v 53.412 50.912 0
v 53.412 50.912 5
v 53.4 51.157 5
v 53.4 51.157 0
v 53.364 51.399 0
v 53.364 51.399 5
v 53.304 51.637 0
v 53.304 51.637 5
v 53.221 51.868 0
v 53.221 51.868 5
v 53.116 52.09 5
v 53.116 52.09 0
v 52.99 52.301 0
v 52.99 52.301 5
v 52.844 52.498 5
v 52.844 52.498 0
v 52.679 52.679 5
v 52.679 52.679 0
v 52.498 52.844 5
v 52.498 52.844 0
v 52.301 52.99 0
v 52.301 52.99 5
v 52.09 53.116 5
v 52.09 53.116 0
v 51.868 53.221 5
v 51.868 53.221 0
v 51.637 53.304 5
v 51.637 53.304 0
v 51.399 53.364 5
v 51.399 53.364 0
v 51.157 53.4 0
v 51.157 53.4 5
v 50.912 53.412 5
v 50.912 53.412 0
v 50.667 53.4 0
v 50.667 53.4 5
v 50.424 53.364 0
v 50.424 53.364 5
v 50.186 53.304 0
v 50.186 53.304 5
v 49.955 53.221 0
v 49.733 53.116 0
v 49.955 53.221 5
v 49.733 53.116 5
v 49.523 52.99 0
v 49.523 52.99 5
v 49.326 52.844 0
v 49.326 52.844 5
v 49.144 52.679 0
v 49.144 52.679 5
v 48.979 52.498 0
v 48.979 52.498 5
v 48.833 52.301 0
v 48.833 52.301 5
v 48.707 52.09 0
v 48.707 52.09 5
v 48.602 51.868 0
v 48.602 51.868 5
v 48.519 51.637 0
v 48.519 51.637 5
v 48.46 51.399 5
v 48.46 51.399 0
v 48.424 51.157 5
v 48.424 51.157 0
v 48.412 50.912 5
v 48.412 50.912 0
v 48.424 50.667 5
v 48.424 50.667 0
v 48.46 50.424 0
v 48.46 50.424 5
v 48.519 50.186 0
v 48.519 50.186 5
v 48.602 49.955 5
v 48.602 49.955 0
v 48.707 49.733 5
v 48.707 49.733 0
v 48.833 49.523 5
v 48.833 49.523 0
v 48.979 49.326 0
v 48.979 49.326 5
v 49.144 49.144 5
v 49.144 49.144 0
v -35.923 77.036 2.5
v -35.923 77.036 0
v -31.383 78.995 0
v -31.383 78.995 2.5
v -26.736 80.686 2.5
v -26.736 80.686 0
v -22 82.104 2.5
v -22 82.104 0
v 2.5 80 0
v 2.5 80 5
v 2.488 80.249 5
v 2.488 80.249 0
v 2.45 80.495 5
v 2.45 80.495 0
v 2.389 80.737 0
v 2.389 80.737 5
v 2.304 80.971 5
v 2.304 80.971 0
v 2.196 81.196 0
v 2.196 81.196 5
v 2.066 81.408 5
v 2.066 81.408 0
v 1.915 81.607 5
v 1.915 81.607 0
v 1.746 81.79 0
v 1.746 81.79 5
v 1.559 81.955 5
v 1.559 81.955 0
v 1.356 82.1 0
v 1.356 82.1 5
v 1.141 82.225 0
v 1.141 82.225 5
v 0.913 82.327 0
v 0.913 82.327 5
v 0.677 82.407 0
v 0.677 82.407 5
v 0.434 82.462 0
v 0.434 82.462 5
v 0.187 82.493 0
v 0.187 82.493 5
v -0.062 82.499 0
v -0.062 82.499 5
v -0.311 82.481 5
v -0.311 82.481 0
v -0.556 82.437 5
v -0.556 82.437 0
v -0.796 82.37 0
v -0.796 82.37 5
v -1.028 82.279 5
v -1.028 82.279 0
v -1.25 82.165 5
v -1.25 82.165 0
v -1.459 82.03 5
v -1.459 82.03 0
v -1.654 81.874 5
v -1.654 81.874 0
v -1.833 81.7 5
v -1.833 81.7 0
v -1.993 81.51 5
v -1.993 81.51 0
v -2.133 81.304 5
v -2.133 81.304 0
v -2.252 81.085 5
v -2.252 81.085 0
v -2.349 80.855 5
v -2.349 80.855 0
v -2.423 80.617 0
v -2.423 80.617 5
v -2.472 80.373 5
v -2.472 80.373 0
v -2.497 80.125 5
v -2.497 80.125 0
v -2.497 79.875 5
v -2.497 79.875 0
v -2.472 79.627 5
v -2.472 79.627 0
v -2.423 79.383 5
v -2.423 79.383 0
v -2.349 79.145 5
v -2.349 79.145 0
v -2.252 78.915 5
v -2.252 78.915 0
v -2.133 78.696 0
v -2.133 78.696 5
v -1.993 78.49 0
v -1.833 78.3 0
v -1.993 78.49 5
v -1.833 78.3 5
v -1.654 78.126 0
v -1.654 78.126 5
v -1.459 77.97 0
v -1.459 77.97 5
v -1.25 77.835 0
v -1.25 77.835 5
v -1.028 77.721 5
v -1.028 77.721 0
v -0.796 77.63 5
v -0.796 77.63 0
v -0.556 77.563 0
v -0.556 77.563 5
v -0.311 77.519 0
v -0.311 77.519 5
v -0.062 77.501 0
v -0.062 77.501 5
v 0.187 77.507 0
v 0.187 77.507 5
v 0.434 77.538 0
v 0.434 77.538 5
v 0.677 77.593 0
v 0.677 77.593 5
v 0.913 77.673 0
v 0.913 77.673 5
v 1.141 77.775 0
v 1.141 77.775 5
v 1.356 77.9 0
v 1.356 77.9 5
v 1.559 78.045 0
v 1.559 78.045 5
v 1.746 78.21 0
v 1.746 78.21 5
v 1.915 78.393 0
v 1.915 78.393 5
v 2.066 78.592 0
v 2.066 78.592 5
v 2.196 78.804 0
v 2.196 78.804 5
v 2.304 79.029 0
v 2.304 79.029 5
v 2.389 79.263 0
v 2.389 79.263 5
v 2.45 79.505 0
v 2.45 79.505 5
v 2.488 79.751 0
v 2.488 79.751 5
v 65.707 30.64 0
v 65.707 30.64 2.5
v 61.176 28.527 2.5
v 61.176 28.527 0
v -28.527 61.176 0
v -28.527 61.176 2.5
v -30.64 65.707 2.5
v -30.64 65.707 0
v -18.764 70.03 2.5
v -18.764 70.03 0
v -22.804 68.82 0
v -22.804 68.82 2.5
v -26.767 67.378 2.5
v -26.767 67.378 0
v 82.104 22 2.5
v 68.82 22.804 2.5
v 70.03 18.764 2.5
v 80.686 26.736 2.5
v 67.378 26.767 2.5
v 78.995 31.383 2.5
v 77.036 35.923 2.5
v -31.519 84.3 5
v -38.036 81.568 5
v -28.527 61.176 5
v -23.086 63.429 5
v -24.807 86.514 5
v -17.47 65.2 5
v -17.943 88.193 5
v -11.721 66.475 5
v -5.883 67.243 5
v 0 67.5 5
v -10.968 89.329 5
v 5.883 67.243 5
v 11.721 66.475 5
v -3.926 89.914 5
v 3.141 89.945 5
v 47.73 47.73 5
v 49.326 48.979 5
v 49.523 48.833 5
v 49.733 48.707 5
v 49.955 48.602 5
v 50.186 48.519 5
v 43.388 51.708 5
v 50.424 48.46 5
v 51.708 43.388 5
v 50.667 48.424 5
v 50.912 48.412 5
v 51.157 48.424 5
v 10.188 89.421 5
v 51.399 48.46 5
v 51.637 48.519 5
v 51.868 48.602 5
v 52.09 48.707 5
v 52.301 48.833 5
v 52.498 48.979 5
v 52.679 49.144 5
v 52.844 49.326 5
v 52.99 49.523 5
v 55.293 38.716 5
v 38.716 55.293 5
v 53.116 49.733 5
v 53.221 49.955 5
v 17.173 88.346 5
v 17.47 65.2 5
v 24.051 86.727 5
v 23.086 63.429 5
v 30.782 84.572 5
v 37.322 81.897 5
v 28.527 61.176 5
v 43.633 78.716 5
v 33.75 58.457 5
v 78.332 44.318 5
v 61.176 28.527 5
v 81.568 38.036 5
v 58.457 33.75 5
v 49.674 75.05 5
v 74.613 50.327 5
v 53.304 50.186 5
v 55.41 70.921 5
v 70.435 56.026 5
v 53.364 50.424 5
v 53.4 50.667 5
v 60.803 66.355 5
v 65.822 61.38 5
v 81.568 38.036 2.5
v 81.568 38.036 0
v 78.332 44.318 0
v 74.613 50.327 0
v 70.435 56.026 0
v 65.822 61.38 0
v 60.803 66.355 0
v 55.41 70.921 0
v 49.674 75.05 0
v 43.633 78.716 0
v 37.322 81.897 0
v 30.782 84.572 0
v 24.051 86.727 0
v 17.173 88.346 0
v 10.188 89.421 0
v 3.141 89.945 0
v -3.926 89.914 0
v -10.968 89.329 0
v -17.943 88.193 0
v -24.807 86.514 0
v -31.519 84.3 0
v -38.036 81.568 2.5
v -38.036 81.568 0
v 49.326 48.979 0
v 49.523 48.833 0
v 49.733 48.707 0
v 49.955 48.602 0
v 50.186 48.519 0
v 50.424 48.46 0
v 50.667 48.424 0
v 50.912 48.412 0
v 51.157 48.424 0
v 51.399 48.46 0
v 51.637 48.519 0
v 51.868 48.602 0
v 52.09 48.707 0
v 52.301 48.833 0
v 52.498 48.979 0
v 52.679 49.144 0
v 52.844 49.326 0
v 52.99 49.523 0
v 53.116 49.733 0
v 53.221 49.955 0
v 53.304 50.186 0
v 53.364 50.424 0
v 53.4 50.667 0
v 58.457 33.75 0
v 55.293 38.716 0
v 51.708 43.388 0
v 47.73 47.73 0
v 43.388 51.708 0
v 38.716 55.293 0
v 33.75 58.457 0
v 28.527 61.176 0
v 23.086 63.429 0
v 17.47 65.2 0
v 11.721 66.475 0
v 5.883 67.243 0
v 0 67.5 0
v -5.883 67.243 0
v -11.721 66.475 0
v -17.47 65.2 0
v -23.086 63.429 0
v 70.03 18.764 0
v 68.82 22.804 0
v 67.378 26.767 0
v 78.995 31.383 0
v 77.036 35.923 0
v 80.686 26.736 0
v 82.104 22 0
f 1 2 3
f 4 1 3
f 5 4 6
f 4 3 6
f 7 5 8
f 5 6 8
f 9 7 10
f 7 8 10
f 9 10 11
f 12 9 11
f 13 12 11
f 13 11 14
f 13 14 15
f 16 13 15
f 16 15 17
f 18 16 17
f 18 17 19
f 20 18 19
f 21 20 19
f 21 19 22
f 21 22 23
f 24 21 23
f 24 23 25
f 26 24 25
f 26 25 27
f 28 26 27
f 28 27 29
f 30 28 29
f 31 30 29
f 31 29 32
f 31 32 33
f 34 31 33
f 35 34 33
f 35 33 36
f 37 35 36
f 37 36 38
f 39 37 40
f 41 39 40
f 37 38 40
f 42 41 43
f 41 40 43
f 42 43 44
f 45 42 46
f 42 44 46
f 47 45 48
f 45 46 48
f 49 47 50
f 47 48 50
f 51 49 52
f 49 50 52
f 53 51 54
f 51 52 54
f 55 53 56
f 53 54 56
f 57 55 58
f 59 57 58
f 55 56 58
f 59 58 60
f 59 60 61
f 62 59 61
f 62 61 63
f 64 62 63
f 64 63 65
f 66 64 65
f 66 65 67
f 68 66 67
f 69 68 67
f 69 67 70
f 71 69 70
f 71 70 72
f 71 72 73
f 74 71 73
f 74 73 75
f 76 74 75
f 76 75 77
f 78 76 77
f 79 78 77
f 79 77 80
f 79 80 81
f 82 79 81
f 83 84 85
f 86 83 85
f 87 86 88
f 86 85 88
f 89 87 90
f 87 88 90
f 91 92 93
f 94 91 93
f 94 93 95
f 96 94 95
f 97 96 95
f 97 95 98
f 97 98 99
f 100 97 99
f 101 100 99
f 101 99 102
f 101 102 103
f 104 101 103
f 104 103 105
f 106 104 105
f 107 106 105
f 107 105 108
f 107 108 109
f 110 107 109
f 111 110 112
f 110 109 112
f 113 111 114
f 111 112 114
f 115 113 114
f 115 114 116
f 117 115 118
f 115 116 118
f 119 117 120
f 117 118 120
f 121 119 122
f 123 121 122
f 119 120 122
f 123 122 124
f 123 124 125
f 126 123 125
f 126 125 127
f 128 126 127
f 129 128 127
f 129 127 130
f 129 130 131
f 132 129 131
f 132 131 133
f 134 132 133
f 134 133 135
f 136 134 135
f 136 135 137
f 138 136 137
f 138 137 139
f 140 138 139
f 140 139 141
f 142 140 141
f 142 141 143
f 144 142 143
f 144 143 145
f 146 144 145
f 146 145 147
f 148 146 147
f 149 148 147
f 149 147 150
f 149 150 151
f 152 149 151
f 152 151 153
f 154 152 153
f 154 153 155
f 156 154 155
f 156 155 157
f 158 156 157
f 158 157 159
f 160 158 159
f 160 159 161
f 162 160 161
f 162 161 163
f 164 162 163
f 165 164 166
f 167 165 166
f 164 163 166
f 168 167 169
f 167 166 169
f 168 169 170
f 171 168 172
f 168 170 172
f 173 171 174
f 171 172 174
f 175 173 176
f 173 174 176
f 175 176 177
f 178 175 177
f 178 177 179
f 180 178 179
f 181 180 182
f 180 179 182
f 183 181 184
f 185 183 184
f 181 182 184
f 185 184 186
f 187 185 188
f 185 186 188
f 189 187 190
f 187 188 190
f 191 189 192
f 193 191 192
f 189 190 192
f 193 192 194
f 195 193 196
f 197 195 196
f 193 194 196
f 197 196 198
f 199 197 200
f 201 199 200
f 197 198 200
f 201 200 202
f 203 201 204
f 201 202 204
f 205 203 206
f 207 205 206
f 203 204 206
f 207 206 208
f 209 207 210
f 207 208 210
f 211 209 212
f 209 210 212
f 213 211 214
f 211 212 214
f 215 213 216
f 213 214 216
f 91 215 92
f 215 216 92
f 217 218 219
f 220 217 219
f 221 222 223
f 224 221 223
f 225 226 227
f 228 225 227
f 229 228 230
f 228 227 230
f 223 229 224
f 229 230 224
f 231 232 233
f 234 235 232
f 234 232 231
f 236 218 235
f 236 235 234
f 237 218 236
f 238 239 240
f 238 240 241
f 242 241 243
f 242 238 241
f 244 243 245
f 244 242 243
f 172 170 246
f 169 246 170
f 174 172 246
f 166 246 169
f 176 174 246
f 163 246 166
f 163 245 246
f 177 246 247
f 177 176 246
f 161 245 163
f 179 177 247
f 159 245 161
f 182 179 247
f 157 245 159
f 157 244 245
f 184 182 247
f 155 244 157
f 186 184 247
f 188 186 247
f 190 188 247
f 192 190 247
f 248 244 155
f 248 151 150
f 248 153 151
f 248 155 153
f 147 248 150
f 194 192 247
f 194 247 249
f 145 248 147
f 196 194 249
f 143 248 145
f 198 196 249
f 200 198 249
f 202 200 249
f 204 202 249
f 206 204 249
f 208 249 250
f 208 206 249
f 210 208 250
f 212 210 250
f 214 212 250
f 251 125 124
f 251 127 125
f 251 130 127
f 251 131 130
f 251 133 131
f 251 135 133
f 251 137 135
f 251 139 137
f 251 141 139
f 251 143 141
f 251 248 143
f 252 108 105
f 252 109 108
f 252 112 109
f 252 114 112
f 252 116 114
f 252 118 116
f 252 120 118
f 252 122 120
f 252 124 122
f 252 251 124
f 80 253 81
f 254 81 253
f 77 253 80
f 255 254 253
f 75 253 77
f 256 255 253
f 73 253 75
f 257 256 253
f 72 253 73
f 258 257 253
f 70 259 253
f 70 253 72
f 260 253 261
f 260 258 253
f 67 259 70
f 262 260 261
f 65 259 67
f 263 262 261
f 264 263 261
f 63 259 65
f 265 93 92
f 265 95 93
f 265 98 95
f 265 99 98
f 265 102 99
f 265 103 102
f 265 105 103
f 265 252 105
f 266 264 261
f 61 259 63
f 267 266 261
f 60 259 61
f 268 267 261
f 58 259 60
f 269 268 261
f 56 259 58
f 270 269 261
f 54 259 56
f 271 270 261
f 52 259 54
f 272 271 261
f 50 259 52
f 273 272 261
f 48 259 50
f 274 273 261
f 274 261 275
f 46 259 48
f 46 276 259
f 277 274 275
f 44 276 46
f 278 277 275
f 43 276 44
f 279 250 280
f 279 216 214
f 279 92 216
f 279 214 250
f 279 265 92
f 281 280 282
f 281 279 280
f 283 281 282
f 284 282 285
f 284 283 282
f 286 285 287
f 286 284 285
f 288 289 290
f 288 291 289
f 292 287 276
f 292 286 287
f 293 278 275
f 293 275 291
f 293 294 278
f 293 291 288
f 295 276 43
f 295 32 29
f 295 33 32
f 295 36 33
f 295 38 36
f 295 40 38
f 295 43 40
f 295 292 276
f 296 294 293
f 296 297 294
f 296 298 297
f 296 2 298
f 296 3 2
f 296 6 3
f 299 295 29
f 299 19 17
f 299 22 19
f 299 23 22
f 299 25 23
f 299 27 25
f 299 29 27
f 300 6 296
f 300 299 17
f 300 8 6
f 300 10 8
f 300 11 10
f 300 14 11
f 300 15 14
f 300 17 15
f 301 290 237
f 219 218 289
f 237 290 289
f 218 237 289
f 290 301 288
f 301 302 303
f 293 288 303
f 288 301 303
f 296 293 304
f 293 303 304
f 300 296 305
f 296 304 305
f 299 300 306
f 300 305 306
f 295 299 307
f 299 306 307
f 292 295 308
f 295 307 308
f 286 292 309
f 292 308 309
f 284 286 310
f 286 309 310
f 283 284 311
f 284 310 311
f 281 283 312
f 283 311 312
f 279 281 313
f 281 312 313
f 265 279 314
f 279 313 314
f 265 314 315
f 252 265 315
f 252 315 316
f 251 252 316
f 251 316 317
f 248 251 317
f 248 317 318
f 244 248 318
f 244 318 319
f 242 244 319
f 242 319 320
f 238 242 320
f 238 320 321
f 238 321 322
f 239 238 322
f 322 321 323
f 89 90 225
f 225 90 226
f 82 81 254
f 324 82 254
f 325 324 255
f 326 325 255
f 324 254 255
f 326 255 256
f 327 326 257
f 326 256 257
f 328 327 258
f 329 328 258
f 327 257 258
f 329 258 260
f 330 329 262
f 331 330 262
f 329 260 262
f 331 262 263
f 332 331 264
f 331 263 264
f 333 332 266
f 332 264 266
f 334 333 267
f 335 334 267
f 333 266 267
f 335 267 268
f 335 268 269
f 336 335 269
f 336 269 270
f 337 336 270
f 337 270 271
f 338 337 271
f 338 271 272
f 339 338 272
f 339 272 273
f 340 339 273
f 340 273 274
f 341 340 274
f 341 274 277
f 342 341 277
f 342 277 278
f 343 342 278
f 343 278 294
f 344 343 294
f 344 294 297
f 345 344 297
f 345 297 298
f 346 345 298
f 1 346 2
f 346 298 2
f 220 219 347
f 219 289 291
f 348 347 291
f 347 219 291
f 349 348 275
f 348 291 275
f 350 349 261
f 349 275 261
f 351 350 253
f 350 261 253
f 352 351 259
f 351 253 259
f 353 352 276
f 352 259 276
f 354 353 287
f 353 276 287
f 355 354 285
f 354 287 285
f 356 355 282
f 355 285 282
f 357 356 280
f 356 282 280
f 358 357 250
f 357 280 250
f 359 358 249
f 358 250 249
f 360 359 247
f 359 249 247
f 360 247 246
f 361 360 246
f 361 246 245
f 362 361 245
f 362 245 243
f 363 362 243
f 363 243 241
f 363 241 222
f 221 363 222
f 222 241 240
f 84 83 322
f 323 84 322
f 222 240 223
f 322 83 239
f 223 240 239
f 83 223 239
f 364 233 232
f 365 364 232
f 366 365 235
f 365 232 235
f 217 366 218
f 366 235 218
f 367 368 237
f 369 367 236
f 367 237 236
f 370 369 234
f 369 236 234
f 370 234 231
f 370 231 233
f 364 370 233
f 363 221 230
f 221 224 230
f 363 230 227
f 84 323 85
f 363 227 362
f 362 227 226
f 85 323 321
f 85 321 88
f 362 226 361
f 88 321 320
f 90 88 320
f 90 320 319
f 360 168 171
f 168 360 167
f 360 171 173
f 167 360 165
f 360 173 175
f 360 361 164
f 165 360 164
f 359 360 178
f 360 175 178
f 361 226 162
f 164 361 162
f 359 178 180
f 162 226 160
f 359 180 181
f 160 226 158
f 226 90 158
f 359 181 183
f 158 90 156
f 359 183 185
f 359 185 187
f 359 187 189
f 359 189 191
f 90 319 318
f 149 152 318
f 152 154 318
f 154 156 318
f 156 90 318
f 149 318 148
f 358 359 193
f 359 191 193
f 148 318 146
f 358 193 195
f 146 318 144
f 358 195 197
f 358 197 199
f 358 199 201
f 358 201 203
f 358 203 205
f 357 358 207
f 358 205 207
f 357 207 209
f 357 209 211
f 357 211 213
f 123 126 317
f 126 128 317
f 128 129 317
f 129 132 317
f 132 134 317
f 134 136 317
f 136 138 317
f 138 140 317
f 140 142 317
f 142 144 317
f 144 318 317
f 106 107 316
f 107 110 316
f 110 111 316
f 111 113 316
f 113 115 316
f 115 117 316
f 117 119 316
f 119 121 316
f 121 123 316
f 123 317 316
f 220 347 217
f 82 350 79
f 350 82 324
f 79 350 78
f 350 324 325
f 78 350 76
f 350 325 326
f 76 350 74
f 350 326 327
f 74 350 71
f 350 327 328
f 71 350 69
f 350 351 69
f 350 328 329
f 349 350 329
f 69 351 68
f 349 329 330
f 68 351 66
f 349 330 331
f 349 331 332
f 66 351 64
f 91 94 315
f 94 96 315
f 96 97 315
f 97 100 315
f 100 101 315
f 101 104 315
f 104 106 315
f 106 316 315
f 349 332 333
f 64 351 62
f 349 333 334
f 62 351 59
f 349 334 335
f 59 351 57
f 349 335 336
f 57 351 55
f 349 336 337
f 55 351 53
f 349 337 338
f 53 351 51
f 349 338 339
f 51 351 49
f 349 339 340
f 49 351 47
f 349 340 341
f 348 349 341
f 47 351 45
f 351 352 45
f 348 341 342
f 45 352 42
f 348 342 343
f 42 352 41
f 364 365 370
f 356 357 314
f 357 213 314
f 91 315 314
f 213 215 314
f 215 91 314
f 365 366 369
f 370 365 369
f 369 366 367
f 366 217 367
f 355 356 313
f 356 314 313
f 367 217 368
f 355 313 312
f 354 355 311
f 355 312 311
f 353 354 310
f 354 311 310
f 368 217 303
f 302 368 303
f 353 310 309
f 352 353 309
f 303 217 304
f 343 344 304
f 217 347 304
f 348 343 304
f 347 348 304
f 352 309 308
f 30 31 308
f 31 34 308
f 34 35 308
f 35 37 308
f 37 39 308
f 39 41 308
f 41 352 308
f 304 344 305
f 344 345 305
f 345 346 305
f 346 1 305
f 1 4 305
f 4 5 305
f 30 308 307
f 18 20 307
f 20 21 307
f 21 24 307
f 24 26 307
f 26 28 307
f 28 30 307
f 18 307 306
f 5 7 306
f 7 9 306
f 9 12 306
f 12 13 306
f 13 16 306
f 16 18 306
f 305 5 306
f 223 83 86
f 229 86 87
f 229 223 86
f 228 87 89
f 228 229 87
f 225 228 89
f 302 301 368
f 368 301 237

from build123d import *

# Parameters (mm, degrees)
F0_R      = 90
F1_DEPTH  = 5
F2_R      = 67.5
F3_DEPTH  = 5
F4_R      = 2.5
F5_DEPTH  = 5.001
F7_DEPTH  = 5.001
F9_DEPTH  = 2.5
F11_DEPTH = 2.501
F13_DEPTH = 2.501
F15_DEPTH = 2.501
F19_DEPTH = 2.5


with BuildPart() as f1:
    # F0 (on Top) → F1 (new body)
    with BuildSketch(Plane.XY):
        Circle(F0_R)
    extrude(amount=F1_DEPTH)

    # F2 (on face) → F3 (cut)
    with BuildSketch(Plane.XY.offset(5)):
        Circle(F2_R)
    extrude(amount=-F3_DEPTH, mode=Mode.SUBTRACT)

    # F4 (on face) → F5 (cut, through all)
    with BuildSketch(Plane.XY.offset(5)):
        with Locations((0, 80)):
            Circle(F4_R)
    extrude(amount=-F5_DEPTH, mode=Mode.SUBTRACT)

    # F6 (on face) → F7 (cut, through all)
    with BuildSketch(Plane.XY.offset(5)):
        with BuildLine():
            ThreePointArc((49.1439212925, 49.1439212925), (51.8683968263, 48.6019894142), (53.4116882454, 50.9116882454))
            ThreePointArc((53.4116882454, 50.9116882454), (49.9549796645, 53.2213870767), (49.1439212925, 49.1439212925))
        make_face()
    extrude(amount=-F7_DEPTH, mode=Mode.SUBTRACT)

    # F8 (on face) → F9 (cut)
    with BuildSketch(Plane.XY.offset(5)):
        with BuildLine():
            Line((-28.5267326675, 61.175775625), (-38.0356435567, 81.5677008333))
            ThreePointArc((-38.0356435567, 81.5677008333), (-30.7818128993, -84.5723358707), (81.5677008333, 38.0356435567))
            Line((81.5677008333, 38.0356435567), (61.175775625, 28.5267326675))
            ThreePointArc((61.175775625, 28.5267326675), (-23.0863596745, -63.429251903), (-28.5267326675, 61.175775625))
        make_face()
    extrude(amount=-F9_DEPTH, mode=Mode.SUBTRACT)

    # F10 (on face) → F11 (cut, through all)
    with BuildSketch(Plane.XY.offset(2.5)):
        with BuildLine():
            ThreePointArc((77.0361638276, 35.9225531477), (-29.0717129108, -79.8738747674), (-35.9225531477, 77.0361638276))
            Line((-35.9225531477, 77.0361638276), (-38.0356435567, 81.5677008333))
            ThreePointArc((-38.0356435567, 81.5677008333), (-48.3569647512, -75.9052301232), (90, 0))
            ThreePointArc((90, 0), (87.8666406408, 19.4795652544), (81.5677008333, 38.0356435567))
            Line((81.5677008333, 38.0356435567), (77.0361638276, 35.9225531477))
        make_face()
    extrude(amount=-F11_DEPTH, mode=Mode.SUBTRACT)

    # F12 (on face) → F13 (cut, through all)
    with BuildSketch(Plane.XY.offset(2.5)):
        with BuildLine():
            Line((-28.5267326675, 61.175775625), (-30.6398239762, 65.7073145602))
            ThreePointArc((-30.6398239762, 65.7073145602), (-24.7964603911, -68.127715007), (65.7073145602, 30.6398239762))
            Line((65.7073145602, 30.6398239762), (61.175775625, 28.5267326675))
            ThreePointArc((61.175775625, 28.5267326675), (65.8999804806, 14.6096739408), (67.5, 0))
            ThreePointArc((67.5, 0), (-36.2677235634, -56.9289225924), (-28.5267326675, 61.175775625))
        make_face()
    extrude(amount=-F13_DEPTH, mode=Mode.SUBTRACT)

    # F14 (on face) → F15 (cut, through all)
    with BuildSketch(Plane.XY.offset(2.5)):
        Polygon((98.6606093618, 26.4360306033), (0, 0), (-50.3402867184, 107.9550932479), (-138.5994553566, -33.6444936693), (-65.9655109048, -85.6016203761), (32.1168266237, -89.8430198431), (88.8455361128, -67.5756856799), align=None)
    extrude(amount=-F15_DEPTH, mode=Mode.SUBTRACT)

    # F18 (on face) → F19 (cut)
    with BuildSketch(Plane(origin=(0, 0, 0), x_dir=(1, 0, 0), z_dir=(0, 0, -1))):
        with BuildLine():
            Line((-21.9996188337, -82.1036952346), (-18.7643804985, -70.029621393))
            ThreePointArc((-18.7643804985, -70.029621393), (-24.7964600325, -68.1277140216), (-30.639823533, -65.7073136098))
            Line((-30.639823533, -65.7073136098), (-35.922552248, -77.0361618981))
            ThreePointArc((-35.922552248, -77.0361618981), (-29.0717121827, -79.8738727668), (-21.9996188337, -82.1036952346))
        make_face()
    extrude(amount=-F19_DEPTH, mode=Mode.SUBTRACT)


solid = f1.part
